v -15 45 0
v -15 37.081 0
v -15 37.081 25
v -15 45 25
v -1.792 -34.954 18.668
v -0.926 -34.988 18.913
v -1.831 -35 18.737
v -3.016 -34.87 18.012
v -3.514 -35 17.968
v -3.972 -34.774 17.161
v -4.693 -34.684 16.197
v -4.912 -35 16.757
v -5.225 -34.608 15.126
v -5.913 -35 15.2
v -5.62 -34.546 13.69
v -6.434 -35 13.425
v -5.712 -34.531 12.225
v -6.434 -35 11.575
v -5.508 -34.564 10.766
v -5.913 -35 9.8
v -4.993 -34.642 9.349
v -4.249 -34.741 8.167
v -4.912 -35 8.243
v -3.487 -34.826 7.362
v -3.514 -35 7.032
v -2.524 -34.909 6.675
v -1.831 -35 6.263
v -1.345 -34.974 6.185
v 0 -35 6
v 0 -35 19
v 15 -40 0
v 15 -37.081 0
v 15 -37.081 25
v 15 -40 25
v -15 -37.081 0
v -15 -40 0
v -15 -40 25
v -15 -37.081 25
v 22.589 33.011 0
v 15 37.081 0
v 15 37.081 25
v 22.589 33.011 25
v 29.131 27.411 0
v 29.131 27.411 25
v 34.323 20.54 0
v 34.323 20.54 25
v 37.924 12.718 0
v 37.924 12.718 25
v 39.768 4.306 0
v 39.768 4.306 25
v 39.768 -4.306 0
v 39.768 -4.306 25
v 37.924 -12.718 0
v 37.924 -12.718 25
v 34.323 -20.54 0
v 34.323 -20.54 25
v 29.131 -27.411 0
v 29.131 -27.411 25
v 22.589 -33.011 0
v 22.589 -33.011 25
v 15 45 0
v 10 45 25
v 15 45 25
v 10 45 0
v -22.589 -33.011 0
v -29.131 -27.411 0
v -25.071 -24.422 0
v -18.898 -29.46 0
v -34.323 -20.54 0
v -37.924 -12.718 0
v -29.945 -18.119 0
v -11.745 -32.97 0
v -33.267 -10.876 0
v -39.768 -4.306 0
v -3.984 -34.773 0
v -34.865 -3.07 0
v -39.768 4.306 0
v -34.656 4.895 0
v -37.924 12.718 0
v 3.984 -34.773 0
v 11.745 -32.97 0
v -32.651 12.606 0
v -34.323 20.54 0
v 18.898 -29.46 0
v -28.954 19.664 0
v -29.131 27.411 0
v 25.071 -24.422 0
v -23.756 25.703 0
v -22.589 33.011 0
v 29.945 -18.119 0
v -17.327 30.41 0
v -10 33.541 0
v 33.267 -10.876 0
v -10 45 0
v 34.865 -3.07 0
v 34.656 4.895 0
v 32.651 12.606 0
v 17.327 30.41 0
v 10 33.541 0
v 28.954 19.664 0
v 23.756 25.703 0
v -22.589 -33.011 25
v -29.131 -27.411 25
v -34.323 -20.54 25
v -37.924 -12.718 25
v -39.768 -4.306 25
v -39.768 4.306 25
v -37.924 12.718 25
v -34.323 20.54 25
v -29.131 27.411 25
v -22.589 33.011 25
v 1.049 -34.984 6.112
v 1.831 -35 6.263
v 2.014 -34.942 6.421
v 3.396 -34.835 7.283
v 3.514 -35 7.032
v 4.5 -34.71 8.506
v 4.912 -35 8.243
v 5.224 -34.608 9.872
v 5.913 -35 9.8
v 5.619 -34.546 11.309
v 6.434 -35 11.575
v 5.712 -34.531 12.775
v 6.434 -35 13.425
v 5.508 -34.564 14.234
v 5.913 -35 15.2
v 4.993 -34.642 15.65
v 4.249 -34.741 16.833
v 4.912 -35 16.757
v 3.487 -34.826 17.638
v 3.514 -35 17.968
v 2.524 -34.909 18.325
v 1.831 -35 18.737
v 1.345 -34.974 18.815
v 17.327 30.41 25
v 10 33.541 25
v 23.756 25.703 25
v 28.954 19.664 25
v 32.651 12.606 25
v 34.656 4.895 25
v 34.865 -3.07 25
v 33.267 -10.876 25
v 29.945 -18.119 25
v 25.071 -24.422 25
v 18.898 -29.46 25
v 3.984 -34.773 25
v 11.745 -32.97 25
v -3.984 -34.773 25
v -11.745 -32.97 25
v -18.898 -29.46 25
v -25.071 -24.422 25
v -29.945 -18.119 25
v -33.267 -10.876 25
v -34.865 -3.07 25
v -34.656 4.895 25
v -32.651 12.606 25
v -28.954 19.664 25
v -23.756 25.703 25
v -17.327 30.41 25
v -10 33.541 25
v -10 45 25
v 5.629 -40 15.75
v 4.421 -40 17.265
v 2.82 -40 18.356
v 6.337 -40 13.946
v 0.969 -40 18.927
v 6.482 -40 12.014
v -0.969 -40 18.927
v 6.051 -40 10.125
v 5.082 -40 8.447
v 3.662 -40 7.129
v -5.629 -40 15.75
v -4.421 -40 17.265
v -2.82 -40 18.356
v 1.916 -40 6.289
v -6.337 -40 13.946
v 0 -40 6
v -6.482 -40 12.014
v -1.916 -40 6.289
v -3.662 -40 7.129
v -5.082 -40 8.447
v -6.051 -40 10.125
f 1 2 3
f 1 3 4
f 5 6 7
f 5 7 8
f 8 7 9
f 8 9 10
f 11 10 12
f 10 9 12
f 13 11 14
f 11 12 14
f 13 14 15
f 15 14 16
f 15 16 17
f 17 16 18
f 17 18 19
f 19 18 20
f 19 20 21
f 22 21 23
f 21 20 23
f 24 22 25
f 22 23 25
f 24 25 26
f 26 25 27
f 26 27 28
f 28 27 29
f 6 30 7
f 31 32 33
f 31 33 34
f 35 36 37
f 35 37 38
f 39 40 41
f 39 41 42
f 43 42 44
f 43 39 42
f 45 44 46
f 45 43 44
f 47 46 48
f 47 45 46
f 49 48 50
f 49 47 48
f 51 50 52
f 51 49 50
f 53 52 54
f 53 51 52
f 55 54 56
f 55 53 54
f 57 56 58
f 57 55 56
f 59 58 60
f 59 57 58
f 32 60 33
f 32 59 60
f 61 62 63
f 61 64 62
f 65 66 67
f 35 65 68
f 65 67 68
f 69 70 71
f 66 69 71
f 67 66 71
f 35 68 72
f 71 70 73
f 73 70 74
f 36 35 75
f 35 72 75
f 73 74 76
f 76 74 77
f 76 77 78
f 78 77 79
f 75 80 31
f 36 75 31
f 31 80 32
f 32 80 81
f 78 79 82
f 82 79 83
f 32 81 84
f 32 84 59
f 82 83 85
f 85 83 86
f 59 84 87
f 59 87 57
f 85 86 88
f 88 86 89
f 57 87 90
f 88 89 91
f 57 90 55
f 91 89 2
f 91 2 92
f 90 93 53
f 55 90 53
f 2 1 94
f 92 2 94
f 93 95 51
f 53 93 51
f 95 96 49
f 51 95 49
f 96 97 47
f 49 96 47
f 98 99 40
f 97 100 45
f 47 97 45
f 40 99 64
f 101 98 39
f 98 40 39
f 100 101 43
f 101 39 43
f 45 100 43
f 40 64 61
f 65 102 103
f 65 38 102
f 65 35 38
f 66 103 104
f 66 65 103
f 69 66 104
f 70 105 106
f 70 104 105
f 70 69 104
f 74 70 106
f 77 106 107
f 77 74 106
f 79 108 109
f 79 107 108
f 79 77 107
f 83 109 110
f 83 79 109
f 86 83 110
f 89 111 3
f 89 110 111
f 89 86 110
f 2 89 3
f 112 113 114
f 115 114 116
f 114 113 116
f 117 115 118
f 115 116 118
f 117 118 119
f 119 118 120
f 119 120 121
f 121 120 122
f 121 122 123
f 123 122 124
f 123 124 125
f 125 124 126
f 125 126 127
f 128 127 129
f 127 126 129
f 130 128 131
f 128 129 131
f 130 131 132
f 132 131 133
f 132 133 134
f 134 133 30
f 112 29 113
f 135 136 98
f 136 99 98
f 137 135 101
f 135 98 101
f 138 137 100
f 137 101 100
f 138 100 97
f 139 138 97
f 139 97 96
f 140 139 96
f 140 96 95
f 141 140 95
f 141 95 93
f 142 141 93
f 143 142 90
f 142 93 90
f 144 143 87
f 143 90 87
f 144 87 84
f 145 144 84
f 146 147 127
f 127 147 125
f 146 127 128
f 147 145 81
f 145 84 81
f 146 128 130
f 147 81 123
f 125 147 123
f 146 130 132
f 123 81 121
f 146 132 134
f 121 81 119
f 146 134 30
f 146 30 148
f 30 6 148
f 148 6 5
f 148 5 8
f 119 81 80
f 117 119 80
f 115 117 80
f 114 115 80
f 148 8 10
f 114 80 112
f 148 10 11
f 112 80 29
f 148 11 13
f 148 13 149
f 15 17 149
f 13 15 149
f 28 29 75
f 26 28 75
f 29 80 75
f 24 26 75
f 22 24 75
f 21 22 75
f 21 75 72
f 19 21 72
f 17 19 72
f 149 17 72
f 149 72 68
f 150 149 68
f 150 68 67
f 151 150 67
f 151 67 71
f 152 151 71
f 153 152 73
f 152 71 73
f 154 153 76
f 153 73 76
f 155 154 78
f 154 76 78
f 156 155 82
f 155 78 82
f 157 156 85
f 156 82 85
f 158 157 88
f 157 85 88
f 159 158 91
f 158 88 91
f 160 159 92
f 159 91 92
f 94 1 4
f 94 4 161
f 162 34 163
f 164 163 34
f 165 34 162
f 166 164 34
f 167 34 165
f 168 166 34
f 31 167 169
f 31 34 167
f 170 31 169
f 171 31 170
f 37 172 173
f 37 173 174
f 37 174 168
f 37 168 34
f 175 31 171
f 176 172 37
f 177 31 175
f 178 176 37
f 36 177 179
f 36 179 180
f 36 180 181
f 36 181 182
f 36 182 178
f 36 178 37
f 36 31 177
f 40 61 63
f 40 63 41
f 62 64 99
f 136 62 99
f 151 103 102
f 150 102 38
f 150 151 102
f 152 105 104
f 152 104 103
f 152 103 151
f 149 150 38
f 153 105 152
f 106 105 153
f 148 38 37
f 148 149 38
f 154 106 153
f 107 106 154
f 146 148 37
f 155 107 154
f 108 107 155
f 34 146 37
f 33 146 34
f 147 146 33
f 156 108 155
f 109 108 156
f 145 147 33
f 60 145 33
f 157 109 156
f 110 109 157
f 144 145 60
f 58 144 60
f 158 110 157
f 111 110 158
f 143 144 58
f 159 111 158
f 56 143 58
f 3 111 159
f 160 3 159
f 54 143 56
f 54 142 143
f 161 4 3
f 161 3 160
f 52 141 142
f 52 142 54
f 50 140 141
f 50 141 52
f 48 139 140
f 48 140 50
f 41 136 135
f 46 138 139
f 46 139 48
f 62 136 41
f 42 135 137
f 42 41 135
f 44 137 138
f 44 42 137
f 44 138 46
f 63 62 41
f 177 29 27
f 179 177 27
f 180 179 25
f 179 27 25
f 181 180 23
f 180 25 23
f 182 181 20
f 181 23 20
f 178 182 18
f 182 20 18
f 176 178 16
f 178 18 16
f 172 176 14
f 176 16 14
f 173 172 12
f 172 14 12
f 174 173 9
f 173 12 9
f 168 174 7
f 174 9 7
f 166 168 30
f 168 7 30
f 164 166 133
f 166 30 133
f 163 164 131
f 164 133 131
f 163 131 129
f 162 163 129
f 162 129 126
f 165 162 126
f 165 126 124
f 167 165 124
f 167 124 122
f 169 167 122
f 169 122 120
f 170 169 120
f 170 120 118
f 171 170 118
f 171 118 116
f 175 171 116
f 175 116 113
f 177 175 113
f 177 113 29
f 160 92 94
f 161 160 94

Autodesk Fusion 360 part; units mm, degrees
sketch "Skizze1" plane through (0, 0, 0) normal (0, 0, 1) x (1, 0, 0)
  circle A0 centre (0, 0) radius 35
  circle A1 centre (0, 0) radius 40
  line L0 (10, 30) -> (-10, 30)
  line L1 (-10, 30) -> (-10, 45)
  line L2 (-10, 45) -> (10, 45)
  line L3 (10, 45) -> (10, 30)
  line L4 (15, 35) -> (10, 35)
  line L5 (10, 35) -> (10, 45)
  line L6 (10, 45) -> (15, 45)
  line L7 (15, 45) -> (15, 35)
  line L8 (-10, 35) -> (-15, 35)
  line L9 (-15, 35) -> (-15, 45)
  line L10 (-15, 45) -> (-10, 45)
  line L11 (-10, 45) -> (-10, 35)
  line L12 (-15, -35) -> (15, -35)
  line L13 (15, -35) -> (15, -40)
  line L14 (15, -40) -> (-15, -40)
  line L15 (-15, -40) -> (-15, -35)
  dimension "d1" = 70
  dimension "d2" = 80
extrude "Extrusion1" add sketch "Skizze1" along normal blind 25 contours A0 A1 L3 L4 L7 L12 L13 | A0 A1 L1 L8 L9 L12 L15 | A1 L12 L13 L15 | A1 L3 L4 L5 L7 | A1 L1 L8 L9 L11 | A1 L3 L5 L6 L7 | A1 L14 L15 | A1 L13 L14 | A1 L1 L9 L10 L11
hole "Bohrung1" at (0, -40, 12.5) direction (0, 1, 0) diameter 13 depth 5 tip angle 118
